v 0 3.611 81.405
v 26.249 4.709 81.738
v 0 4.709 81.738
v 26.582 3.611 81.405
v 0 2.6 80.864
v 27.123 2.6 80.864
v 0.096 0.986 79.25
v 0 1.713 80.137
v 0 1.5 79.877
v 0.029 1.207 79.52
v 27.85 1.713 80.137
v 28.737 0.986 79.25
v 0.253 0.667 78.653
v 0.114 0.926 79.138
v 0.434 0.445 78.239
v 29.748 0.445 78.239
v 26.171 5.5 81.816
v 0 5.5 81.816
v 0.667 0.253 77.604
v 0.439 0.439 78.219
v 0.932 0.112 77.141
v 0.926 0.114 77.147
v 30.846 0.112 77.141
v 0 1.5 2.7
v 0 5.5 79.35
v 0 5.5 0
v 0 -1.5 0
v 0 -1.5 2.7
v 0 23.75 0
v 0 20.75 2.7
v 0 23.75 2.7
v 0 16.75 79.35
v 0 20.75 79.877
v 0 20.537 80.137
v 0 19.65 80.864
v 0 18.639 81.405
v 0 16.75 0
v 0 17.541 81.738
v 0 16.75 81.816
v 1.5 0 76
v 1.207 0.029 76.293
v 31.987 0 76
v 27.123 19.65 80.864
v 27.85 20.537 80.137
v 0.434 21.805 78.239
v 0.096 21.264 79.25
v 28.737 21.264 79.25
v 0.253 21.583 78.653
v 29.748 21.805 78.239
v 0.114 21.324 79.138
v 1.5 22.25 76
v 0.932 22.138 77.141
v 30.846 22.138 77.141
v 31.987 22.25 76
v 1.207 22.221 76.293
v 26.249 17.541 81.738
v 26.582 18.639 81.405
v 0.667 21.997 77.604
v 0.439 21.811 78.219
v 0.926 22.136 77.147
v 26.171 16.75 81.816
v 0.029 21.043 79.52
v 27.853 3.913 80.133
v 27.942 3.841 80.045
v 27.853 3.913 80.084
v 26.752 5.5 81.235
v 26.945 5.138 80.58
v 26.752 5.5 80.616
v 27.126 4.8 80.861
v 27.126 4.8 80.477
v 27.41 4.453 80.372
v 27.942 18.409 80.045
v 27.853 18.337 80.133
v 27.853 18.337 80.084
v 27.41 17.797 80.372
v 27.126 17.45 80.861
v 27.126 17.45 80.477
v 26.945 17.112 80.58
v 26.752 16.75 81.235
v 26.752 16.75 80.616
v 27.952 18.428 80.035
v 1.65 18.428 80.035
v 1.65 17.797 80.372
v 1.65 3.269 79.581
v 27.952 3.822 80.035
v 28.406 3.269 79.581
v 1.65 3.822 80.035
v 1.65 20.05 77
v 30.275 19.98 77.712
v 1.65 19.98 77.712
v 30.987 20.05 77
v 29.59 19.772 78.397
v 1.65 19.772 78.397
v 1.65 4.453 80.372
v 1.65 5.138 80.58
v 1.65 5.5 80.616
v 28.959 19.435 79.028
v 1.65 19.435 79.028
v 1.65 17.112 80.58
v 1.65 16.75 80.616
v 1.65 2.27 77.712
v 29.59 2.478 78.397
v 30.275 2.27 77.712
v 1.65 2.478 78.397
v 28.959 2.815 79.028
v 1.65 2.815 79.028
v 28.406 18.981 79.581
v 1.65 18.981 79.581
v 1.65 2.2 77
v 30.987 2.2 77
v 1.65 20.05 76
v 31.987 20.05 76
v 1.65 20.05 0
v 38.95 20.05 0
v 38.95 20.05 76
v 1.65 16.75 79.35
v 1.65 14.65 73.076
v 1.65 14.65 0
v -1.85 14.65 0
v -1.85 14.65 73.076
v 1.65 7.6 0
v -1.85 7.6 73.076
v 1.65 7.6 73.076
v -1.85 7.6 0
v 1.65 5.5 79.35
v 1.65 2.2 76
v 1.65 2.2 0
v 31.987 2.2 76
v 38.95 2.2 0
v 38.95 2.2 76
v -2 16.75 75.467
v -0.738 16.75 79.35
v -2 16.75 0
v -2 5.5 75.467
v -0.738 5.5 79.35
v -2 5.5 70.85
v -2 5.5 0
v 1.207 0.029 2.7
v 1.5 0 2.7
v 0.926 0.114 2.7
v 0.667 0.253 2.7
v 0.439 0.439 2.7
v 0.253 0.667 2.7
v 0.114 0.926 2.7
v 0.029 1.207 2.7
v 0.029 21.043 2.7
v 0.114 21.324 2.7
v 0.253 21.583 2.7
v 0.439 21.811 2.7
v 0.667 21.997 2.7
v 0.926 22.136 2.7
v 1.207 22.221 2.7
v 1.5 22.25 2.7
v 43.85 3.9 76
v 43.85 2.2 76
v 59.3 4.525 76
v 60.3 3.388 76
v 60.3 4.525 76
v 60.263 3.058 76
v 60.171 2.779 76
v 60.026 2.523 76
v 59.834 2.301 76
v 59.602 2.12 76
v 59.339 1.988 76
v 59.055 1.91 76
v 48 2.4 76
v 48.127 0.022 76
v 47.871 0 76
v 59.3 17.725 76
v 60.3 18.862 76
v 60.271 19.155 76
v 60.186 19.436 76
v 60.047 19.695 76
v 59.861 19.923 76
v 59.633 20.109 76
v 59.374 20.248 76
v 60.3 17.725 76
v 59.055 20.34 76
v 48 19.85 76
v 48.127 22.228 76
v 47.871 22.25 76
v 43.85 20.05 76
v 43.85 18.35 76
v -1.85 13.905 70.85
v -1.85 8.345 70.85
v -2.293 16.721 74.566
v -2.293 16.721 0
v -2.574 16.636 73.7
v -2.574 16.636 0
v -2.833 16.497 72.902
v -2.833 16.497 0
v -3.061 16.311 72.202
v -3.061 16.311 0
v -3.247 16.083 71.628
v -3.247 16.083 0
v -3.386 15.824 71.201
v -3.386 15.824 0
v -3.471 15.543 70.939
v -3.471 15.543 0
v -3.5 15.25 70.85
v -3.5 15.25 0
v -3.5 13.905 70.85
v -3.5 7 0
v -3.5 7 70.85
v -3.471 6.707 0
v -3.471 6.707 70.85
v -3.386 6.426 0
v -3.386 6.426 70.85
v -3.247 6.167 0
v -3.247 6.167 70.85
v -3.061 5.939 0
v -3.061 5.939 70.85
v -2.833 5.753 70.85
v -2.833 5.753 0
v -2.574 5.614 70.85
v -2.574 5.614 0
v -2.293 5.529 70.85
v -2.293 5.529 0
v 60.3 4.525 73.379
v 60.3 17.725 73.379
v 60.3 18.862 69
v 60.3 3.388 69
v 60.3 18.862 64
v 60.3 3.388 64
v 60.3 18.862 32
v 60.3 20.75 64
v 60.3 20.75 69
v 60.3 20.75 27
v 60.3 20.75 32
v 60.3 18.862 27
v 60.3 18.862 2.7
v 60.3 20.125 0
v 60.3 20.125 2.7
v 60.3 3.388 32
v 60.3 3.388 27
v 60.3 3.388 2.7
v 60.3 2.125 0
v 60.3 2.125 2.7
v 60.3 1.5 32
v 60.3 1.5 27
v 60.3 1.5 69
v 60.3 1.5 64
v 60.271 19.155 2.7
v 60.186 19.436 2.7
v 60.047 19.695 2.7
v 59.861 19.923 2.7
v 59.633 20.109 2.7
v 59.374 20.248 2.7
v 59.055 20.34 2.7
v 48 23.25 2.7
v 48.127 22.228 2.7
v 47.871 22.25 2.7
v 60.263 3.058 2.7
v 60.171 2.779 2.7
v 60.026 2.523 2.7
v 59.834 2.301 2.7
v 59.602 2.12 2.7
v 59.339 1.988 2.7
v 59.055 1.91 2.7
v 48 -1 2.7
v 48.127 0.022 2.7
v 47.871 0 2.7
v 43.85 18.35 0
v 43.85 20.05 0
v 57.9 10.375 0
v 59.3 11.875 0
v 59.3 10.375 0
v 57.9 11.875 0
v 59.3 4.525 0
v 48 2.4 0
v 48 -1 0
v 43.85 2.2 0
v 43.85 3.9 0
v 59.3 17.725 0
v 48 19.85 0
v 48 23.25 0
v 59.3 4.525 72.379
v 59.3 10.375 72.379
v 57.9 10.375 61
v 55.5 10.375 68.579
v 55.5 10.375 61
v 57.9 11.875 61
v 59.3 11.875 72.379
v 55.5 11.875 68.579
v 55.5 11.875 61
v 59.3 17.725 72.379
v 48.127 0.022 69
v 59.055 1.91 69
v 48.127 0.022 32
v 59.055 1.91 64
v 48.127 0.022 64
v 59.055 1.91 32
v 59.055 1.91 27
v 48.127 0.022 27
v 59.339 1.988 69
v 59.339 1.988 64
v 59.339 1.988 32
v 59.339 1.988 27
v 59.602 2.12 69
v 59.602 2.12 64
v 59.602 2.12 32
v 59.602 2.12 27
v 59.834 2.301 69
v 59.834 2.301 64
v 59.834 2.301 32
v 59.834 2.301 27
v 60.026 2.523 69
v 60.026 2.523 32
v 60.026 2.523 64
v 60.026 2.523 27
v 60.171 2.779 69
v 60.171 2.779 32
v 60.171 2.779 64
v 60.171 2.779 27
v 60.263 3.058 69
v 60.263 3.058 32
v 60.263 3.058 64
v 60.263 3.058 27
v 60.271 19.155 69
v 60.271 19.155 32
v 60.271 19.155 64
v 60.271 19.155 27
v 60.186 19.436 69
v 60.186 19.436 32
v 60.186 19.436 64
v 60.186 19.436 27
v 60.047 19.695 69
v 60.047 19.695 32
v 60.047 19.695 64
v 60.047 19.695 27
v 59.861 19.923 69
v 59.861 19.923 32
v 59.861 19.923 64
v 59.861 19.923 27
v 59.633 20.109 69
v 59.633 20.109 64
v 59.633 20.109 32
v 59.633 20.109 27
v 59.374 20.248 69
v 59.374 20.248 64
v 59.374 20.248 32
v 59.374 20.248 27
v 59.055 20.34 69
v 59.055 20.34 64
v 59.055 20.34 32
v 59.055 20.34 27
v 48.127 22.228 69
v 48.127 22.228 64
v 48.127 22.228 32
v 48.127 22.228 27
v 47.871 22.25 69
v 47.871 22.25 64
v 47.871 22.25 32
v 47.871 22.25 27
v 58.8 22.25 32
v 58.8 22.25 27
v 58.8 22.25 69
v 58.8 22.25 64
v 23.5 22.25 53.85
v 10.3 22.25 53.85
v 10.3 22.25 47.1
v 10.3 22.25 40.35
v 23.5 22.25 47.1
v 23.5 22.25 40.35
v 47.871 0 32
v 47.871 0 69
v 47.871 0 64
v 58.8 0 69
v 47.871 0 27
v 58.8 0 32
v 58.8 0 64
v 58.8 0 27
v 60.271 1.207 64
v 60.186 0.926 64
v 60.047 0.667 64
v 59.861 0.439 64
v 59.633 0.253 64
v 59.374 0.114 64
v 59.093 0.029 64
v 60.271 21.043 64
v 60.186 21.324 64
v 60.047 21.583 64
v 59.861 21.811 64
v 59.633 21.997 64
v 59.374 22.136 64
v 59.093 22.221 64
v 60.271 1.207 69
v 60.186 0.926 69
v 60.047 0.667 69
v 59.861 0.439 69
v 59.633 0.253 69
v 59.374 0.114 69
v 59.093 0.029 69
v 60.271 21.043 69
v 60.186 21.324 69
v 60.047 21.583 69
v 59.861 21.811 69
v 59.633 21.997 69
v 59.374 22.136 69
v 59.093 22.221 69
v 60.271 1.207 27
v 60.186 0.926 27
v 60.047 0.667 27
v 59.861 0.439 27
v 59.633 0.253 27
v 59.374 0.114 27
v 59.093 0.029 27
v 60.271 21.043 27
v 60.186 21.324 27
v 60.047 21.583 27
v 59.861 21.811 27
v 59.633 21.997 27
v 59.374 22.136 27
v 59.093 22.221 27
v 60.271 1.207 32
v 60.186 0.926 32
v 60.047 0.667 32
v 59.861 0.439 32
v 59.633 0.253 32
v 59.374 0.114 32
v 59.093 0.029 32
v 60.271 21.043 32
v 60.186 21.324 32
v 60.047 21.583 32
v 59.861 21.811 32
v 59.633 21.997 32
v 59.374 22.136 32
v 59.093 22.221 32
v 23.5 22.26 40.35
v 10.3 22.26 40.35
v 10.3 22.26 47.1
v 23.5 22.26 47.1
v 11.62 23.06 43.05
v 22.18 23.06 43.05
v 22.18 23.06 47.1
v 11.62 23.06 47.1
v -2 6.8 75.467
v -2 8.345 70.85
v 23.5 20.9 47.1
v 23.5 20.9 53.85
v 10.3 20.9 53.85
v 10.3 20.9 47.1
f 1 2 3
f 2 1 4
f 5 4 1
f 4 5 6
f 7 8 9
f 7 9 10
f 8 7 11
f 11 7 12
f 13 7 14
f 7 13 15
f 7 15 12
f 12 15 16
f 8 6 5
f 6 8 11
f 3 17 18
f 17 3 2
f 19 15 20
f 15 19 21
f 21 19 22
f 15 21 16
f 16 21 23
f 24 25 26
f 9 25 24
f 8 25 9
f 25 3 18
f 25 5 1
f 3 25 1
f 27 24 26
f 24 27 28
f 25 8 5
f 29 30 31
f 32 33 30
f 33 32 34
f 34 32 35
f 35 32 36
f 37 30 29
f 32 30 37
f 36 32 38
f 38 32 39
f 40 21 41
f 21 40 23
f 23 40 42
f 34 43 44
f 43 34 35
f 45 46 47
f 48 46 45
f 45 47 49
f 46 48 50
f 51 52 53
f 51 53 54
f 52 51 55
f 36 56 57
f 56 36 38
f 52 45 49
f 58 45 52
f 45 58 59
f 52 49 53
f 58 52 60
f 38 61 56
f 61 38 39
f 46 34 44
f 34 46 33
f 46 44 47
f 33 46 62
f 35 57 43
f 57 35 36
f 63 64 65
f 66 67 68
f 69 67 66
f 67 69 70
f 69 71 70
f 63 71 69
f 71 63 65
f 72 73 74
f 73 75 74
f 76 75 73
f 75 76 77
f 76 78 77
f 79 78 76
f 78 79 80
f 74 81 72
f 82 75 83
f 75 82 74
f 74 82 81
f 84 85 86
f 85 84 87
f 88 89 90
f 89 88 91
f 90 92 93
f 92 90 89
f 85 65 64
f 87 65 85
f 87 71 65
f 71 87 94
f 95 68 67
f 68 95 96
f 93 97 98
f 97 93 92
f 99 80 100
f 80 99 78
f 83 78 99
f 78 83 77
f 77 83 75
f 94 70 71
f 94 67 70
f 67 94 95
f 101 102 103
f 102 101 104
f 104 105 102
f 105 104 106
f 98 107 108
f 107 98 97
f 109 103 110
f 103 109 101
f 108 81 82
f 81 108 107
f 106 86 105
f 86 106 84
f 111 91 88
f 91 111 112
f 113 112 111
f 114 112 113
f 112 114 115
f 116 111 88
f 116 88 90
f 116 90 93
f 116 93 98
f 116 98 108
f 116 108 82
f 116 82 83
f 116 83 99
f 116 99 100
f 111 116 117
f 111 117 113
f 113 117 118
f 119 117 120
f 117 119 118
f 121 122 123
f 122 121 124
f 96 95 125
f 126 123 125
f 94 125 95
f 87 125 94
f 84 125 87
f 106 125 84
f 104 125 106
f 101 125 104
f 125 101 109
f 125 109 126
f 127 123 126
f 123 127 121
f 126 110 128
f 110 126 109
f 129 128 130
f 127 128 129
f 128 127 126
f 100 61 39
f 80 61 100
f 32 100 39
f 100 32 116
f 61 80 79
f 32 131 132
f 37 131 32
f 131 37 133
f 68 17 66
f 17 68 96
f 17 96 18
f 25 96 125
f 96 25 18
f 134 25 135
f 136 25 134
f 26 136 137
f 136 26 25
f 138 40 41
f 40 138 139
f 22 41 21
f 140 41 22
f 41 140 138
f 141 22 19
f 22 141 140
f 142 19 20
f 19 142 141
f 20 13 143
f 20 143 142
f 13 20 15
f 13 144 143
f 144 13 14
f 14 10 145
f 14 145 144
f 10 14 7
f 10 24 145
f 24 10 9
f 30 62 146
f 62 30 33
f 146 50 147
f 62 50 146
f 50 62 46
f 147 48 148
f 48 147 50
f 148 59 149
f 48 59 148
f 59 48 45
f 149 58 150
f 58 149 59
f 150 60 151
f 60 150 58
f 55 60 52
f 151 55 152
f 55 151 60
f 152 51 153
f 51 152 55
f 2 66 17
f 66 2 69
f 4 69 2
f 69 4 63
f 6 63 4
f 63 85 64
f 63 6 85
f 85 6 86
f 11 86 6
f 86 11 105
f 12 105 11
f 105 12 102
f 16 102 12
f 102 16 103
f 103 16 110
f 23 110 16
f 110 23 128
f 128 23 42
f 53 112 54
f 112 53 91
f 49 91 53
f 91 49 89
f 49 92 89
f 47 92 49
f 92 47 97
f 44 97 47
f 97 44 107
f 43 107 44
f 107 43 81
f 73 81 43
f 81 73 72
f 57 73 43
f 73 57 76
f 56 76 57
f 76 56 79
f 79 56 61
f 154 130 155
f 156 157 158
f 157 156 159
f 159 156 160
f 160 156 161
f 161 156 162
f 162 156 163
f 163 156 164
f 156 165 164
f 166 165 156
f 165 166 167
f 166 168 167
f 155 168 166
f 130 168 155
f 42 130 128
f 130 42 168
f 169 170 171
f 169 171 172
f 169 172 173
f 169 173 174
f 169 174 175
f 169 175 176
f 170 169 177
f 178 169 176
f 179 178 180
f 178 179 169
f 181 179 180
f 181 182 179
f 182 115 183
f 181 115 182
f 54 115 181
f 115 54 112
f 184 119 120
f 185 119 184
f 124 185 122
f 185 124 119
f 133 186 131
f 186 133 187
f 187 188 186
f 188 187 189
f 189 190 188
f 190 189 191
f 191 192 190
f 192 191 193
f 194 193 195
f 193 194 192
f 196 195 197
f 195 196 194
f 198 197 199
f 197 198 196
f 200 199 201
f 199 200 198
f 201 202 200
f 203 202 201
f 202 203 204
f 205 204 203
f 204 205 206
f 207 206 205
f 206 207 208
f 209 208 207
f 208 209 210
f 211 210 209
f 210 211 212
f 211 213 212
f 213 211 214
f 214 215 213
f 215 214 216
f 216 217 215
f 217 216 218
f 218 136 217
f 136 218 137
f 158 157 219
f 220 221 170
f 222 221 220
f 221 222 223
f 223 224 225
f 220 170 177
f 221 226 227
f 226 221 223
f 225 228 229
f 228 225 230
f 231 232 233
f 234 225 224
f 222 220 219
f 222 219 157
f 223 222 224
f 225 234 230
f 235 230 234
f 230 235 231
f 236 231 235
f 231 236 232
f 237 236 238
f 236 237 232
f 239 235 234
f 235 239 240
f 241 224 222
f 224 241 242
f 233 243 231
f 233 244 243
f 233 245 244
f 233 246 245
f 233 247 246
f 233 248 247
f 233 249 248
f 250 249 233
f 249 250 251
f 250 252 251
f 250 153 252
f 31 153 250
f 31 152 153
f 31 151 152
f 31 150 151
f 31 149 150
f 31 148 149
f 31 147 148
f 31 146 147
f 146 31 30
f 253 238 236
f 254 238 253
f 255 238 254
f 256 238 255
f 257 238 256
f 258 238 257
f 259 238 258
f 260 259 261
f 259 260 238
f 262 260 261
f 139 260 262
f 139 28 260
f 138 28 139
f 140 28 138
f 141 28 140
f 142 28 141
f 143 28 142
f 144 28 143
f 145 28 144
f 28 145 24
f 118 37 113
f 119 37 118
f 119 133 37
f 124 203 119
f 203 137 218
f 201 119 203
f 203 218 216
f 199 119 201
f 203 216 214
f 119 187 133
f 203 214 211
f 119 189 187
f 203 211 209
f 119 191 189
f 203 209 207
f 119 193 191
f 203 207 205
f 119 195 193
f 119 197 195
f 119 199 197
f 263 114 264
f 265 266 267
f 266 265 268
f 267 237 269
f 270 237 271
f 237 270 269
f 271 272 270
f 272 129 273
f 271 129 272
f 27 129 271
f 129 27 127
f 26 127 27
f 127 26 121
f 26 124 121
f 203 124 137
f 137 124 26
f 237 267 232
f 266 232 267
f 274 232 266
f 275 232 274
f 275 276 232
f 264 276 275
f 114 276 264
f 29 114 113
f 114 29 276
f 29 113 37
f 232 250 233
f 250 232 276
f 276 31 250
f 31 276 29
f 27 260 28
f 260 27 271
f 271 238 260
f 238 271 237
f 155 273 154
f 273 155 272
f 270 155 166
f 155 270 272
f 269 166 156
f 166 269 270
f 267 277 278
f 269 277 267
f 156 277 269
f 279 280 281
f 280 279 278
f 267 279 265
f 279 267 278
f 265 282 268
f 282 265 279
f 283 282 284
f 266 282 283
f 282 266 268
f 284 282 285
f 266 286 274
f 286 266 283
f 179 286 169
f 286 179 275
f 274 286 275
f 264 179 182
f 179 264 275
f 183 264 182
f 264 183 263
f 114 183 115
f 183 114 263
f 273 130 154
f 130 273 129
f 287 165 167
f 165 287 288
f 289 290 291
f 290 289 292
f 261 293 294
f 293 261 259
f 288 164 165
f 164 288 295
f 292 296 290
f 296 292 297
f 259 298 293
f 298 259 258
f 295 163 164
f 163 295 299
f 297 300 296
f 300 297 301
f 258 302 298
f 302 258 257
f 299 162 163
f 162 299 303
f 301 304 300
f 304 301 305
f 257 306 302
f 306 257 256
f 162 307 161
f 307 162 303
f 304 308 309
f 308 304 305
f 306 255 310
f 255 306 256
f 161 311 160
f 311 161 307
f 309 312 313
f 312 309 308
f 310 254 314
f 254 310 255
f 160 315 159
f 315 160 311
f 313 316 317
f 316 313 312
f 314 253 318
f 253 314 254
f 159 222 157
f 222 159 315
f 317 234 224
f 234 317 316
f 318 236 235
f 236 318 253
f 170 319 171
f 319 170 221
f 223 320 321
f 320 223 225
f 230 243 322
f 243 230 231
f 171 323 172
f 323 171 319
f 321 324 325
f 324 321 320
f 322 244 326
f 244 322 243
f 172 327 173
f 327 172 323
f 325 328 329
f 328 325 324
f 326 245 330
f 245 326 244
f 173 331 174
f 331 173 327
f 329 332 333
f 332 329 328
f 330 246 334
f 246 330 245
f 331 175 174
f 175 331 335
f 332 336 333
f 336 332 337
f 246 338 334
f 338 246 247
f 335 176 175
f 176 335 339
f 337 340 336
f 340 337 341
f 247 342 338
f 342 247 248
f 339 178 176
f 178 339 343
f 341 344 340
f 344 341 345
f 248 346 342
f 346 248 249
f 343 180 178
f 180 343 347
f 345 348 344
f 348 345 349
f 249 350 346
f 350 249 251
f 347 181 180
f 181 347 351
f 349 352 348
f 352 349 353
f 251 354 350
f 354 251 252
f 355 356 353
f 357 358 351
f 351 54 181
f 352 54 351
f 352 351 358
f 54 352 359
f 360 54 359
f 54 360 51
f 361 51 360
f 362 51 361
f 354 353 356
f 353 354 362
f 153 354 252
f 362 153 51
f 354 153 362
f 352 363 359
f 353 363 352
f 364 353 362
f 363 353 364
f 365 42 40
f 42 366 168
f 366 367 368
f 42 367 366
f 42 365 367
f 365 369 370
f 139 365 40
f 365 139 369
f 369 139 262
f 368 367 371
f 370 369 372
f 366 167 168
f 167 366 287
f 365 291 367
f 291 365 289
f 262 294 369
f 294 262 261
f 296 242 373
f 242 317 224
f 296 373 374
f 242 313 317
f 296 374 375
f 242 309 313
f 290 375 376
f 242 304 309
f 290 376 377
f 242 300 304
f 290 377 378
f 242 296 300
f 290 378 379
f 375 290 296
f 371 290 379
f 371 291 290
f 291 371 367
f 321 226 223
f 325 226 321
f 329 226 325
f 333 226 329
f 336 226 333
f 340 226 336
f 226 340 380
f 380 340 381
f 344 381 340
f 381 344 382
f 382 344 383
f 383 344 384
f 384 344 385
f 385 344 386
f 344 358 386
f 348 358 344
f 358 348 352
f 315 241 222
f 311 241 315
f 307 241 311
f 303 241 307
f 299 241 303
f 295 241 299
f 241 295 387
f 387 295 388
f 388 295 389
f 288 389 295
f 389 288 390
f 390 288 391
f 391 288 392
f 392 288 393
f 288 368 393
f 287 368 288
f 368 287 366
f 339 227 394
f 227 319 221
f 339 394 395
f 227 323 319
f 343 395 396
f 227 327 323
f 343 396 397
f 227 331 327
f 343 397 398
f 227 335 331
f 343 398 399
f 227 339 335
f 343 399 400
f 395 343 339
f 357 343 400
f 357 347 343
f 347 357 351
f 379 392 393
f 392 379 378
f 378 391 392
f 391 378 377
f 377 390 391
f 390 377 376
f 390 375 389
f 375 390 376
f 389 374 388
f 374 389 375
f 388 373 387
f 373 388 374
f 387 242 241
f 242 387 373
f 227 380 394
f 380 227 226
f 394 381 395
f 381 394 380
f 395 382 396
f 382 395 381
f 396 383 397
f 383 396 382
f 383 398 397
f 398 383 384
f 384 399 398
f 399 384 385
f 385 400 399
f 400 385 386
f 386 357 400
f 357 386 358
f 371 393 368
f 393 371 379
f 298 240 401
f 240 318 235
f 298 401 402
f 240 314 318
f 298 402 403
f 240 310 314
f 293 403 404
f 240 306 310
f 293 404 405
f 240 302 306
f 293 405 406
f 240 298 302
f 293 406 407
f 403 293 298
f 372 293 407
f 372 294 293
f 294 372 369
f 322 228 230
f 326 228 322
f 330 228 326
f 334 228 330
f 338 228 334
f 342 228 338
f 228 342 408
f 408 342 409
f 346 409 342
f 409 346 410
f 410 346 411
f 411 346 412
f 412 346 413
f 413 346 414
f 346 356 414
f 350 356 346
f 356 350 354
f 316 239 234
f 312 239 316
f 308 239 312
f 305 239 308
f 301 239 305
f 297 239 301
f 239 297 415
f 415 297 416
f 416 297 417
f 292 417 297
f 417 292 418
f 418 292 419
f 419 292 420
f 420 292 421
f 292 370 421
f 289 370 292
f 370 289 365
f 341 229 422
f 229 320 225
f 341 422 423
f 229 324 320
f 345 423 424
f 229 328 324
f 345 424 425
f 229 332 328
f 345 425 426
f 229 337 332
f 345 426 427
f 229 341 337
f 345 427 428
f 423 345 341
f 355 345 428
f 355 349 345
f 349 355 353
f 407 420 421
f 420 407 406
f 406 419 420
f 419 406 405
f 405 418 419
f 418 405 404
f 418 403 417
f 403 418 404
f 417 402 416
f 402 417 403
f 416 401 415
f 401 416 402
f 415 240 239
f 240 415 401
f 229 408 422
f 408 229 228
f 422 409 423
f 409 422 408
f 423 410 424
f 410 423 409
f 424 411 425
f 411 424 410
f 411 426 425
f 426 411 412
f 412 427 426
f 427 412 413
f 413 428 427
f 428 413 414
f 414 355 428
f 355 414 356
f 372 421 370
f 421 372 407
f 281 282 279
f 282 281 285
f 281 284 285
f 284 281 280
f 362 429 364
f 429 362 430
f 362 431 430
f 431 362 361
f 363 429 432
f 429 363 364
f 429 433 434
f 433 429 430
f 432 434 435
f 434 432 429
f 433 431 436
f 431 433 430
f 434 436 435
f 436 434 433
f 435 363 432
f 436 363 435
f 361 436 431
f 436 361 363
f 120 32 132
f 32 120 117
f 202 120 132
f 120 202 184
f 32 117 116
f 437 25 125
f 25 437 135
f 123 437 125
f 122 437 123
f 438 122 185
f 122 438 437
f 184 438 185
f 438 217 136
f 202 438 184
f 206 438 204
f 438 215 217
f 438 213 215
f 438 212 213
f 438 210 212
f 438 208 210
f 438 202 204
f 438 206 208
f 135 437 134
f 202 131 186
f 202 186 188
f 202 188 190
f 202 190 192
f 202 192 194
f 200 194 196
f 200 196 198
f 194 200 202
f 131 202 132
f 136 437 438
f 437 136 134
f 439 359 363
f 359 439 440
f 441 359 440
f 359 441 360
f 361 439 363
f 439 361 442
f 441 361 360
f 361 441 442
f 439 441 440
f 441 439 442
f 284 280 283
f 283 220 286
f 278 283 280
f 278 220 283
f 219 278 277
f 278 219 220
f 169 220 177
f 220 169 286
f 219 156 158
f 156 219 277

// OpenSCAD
include <magazine.scad>;

// short section
// union() {
//     intersection() {
//         straight_section();
//         translate([-20, 0, 0])
//             cube([300, 300, 7]);
//     }
//     bottom_brim();
// }


// straight upper section
straight_len = 76;

module magazine_body() {
    difference() {
        union() {
            straight_section(straight_len);

            front_ridge(upper_rib_z0, upper_rib_z1);
            front_ridge(lower_rib_z0, lower_rib_z1);
            feed_lips();
            bottom_brim();

            translate([x_front_inset - front_follower_stop_x, follower_y_lo, straight_len - front_follower_stop_h])
                cube([front_follower_stop_x, follower_front_w, front_follower_stop_h]);

            // over-insertion stop
            insert_stop();

        }

        // cutouts for bolt and LRBHO catch
        bolt_cutout();

        // connection point for the magazine catch
        magazine_catch_cutout();

        // feed ramp cutout
        front_feed_cutout();



    }
}
magazine_body();
